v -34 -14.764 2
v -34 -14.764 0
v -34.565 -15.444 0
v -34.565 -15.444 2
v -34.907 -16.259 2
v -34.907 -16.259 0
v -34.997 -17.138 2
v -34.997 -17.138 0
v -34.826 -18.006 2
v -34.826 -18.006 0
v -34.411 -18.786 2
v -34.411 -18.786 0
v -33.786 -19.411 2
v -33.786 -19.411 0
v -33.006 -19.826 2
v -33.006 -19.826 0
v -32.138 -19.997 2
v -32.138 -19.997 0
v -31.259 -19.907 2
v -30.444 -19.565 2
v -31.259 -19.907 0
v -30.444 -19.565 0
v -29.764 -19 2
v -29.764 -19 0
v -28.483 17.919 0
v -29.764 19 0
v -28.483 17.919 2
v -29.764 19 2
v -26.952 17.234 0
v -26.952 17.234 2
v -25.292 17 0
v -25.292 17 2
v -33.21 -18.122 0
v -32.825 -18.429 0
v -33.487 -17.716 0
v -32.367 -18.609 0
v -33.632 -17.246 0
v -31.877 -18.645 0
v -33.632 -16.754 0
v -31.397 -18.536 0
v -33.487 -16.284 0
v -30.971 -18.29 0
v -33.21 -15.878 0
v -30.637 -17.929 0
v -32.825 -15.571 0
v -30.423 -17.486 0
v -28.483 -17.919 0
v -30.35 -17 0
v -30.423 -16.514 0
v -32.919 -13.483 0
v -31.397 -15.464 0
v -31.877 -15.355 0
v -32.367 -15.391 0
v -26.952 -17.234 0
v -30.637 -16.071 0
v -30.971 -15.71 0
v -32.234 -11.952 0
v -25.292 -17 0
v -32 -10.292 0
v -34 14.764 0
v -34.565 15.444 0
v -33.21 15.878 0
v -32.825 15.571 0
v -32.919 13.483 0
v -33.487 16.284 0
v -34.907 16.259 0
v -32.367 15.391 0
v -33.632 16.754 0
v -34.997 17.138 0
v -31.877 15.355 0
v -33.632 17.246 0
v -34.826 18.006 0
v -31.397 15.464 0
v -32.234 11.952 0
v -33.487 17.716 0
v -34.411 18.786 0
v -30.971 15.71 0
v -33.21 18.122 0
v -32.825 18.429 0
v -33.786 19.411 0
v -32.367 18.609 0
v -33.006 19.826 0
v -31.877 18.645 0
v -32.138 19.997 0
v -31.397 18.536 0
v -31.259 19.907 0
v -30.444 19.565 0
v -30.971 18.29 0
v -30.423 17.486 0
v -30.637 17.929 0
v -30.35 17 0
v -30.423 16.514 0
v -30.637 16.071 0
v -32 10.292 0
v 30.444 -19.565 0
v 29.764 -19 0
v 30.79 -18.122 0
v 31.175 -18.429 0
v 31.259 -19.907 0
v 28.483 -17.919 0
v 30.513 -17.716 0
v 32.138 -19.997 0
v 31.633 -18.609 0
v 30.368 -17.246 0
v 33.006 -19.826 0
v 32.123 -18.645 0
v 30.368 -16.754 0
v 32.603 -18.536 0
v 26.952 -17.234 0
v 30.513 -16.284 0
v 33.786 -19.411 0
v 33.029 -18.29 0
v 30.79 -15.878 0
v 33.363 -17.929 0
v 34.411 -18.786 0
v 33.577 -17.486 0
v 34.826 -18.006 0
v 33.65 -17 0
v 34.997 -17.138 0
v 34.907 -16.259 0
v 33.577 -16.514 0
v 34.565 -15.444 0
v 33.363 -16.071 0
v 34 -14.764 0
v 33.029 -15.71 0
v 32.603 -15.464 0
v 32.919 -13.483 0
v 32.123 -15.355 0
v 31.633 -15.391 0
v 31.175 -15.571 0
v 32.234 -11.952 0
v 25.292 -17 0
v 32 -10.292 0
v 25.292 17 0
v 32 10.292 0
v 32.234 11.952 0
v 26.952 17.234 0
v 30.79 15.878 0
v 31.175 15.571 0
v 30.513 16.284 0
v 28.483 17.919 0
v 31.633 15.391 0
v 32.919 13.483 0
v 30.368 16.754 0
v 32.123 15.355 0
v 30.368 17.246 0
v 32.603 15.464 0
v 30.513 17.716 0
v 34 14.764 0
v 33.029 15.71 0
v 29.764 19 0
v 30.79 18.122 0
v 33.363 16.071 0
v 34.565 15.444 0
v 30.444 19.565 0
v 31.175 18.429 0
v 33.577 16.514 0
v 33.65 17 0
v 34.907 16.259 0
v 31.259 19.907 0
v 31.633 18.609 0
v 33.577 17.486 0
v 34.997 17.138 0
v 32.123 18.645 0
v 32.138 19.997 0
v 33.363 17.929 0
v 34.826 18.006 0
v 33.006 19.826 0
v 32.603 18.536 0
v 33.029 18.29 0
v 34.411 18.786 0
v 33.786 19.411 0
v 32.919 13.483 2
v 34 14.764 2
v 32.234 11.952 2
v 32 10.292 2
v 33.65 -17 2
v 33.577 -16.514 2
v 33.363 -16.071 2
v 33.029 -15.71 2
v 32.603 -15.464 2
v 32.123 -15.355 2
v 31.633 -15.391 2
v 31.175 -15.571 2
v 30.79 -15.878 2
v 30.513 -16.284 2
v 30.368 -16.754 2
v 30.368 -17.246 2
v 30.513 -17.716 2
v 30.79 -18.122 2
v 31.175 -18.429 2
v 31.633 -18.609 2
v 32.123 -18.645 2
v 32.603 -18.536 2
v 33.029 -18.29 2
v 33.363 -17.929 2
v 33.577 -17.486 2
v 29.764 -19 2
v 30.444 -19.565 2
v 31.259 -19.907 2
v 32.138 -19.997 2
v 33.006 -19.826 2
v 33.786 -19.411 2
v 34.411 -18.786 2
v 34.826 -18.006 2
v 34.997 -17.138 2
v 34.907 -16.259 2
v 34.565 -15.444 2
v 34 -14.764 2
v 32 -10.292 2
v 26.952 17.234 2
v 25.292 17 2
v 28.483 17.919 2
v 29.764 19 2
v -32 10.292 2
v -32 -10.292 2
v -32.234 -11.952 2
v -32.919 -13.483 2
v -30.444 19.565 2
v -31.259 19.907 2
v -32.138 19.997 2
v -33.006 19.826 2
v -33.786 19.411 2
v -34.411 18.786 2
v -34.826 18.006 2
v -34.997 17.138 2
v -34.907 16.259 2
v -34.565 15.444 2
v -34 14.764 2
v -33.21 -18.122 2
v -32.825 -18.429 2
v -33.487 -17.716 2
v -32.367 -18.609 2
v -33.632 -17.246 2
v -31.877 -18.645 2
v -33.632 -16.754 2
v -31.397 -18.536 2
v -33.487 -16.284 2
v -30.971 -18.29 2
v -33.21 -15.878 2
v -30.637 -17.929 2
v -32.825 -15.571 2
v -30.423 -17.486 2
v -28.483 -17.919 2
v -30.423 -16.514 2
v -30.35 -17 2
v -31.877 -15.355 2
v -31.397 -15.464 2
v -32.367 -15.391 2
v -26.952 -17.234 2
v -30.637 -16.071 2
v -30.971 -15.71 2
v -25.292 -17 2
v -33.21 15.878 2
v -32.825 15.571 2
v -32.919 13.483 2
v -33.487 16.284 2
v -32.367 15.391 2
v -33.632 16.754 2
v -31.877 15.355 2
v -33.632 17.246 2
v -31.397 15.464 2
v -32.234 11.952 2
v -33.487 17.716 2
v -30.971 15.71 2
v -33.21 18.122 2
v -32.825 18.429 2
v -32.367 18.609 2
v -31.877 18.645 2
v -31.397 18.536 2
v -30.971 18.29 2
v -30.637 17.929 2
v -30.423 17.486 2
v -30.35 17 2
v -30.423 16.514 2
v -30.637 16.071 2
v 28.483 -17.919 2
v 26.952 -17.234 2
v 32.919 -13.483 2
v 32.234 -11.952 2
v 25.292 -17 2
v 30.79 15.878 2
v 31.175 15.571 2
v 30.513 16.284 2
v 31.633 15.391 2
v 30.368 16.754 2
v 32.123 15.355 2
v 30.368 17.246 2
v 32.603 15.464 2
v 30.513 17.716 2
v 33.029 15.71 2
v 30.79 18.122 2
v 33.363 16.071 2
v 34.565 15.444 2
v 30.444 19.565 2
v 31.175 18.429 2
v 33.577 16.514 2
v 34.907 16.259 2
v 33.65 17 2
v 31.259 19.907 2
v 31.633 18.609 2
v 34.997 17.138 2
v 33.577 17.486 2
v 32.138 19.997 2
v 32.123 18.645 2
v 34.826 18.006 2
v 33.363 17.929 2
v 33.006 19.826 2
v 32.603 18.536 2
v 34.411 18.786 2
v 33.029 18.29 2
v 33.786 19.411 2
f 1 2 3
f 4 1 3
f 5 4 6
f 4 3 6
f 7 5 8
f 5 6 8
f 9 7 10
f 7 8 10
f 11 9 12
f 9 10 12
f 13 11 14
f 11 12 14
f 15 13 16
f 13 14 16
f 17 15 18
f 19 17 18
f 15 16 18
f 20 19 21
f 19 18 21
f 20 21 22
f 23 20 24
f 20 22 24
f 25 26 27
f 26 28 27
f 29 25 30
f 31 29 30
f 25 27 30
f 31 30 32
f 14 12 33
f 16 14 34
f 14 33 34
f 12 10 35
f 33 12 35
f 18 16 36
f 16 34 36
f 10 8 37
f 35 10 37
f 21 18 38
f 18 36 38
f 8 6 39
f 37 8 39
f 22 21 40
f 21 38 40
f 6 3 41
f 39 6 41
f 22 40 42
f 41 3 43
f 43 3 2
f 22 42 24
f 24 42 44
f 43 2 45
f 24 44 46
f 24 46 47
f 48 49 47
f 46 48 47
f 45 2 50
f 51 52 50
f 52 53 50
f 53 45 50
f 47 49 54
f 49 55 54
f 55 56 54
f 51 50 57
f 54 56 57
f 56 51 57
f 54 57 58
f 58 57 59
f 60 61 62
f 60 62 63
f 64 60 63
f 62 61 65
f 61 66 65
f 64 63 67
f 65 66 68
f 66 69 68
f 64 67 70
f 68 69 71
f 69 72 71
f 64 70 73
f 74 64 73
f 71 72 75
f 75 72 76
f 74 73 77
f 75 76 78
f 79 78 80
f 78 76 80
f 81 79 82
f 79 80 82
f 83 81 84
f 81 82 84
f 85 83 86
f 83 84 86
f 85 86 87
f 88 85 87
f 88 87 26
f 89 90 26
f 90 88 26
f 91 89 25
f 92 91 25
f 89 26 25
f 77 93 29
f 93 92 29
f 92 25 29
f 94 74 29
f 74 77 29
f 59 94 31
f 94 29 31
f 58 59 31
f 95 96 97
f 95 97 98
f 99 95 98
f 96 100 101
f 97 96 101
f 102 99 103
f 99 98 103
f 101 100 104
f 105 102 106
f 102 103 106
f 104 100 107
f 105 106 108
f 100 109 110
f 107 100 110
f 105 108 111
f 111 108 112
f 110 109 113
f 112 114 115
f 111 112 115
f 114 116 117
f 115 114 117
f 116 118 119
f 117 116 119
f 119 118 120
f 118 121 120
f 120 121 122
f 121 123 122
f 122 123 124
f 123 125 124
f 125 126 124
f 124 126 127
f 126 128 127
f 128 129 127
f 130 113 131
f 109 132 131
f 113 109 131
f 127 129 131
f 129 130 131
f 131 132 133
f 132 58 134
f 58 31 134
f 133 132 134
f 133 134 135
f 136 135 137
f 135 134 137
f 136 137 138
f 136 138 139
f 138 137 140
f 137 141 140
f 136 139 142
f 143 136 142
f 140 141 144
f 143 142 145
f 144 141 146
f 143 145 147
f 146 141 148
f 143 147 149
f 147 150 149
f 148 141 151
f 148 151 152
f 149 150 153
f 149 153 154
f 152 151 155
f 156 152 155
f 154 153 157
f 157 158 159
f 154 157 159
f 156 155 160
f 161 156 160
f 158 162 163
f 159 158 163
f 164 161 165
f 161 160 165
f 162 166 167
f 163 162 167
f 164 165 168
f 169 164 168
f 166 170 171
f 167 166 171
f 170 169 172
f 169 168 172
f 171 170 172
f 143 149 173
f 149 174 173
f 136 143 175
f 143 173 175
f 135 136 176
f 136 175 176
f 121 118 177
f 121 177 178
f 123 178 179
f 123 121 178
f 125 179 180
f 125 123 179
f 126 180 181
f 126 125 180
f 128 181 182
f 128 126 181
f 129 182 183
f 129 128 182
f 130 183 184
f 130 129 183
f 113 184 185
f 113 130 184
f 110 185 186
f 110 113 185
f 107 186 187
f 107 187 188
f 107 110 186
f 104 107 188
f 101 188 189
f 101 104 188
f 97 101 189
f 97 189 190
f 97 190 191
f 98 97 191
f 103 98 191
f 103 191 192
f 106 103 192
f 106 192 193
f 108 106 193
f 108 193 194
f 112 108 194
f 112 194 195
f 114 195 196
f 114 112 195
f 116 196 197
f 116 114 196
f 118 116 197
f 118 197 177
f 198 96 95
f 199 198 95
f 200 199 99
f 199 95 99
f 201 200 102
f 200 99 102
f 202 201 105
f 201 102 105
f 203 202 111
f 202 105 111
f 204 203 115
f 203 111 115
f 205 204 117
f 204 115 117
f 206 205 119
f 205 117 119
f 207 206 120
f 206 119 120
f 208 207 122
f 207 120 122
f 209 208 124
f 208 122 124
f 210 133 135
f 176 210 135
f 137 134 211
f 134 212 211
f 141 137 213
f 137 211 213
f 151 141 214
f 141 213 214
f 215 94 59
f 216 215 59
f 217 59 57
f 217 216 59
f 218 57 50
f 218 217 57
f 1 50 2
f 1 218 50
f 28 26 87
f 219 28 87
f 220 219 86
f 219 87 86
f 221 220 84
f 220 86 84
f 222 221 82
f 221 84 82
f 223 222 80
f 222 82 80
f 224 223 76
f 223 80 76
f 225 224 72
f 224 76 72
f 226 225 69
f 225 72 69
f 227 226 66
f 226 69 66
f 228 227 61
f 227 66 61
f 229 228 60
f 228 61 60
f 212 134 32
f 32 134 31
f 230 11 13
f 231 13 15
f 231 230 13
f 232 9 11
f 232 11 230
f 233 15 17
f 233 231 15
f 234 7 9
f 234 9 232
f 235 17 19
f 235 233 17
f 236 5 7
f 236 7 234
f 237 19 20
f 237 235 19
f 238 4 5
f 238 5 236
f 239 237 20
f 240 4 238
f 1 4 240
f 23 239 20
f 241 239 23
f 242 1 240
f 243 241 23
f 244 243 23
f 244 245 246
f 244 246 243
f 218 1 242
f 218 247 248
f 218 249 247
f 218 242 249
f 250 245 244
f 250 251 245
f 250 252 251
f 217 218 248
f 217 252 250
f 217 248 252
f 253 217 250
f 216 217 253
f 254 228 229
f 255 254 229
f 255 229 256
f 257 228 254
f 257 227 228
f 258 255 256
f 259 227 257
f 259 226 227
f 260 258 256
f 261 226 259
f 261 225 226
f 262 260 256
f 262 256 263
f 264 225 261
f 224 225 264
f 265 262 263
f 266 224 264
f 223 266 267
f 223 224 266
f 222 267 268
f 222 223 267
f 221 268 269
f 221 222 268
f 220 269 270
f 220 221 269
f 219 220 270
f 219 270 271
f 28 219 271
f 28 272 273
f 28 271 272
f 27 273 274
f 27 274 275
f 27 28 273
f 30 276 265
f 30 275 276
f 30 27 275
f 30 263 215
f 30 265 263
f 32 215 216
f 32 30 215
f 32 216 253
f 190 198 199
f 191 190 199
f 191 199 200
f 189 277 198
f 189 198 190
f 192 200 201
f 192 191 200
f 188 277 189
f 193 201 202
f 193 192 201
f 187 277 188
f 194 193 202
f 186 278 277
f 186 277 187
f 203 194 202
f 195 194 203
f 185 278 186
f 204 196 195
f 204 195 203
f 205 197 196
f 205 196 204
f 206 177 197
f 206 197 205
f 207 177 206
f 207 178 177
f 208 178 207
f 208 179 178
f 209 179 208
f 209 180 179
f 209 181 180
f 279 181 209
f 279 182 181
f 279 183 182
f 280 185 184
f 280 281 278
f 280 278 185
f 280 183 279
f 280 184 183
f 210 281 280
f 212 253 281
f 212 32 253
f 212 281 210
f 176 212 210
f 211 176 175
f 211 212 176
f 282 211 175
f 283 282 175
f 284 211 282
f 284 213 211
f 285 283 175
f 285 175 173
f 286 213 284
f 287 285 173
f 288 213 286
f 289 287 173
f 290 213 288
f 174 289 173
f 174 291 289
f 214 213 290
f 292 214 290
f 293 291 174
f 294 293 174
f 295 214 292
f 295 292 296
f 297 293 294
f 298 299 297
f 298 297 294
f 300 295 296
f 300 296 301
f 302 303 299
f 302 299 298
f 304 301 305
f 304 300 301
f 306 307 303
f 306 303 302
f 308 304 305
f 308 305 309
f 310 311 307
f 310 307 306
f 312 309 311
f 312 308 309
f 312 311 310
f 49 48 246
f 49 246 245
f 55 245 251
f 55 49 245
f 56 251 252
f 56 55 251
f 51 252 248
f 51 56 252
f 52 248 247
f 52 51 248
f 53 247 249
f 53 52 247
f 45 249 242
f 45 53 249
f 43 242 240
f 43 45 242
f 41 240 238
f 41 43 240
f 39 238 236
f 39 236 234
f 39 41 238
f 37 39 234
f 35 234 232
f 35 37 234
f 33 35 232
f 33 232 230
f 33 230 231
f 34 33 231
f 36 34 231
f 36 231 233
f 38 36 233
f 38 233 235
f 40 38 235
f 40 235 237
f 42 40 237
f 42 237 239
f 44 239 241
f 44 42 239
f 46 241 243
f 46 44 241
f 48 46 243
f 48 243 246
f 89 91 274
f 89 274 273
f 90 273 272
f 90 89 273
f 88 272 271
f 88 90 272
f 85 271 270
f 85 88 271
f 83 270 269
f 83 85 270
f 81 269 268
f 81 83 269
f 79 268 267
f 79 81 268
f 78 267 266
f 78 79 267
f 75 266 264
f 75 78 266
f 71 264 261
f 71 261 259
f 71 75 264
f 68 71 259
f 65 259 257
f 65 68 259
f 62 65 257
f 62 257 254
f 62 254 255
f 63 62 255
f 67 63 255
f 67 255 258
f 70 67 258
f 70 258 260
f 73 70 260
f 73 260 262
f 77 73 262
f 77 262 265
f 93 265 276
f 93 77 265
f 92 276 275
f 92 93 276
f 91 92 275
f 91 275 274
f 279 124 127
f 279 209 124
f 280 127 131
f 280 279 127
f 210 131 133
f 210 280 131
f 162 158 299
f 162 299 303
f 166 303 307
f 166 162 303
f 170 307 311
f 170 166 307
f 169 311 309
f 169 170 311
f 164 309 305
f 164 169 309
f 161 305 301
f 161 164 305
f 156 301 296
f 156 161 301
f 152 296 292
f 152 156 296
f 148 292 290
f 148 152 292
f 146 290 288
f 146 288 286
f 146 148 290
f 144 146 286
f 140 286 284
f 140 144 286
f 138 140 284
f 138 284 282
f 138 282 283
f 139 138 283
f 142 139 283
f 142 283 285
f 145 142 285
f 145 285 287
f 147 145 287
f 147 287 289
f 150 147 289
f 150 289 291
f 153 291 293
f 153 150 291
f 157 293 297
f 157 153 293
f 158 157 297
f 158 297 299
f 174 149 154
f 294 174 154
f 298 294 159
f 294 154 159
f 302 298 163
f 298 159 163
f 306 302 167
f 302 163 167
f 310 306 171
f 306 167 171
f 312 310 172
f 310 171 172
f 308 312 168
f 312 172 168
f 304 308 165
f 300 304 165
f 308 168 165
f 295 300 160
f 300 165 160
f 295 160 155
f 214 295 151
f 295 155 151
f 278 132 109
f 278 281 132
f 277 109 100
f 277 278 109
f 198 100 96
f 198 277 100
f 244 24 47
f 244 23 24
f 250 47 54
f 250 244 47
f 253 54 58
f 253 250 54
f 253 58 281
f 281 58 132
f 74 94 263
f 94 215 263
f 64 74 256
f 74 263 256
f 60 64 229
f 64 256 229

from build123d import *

# Parameters (mm, degrees)
SKETCH_R  = 1.65
PAD_DEPTH = 2
FILLET_R  = 6


with BuildPart() as part:
    # Sketch → Pad (new body)
    with BuildSketch(Plane.XY):
        with BuildLine():
            Line((-32, 14), (-32, -14))
            ThreePointArc((-32, -14), (-34.12132, -19.12132), (-29, -17))
            Line((-29, -17), (29, -17))
            ThreePointArc((29, -17), (34.12132, -19.12132), (32, -14))
            Line((32, -14), (32, 14))
            ThreePointArc((32, 14), (34.12132, 19.12132), (29, 17))
            Line((29, 17), (-29, 17))
            ThreePointArc((-29, 17), (-34.12132, 19.12132), (-32, 14))
        make_face()
        with Locations((-32, 17)):
            Circle(SKETCH_R, mode=Mode.SUBTRACT)
        with Locations((-32, -17)):
            Circle(SKETCH_R, mode=Mode.SUBTRACT)
        with Locations((32, -17)):
            Circle(SKETCH_R, mode=Mode.SUBTRACT)
        with Locations((32, 17)):
            Circle(SKETCH_R, mode=Mode.SUBTRACT)
    extrude(amount=PAD_DEPTH)

    # Fillet
    fillet_edges = [part.edges().sort_by_distance(p)[0] for p in [
        (-29, -17, 1),
        (29, -17, 1),
        (32, -14, 1),
        (32, 14, 1),
        (29, 17, 1),
        (-29, 17, 1),
        (-32, 14, 1),
        (-32, -14, 1),
    ]]
    fillet(fillet_edges, radius=FILLET_R)


solid = part.part
